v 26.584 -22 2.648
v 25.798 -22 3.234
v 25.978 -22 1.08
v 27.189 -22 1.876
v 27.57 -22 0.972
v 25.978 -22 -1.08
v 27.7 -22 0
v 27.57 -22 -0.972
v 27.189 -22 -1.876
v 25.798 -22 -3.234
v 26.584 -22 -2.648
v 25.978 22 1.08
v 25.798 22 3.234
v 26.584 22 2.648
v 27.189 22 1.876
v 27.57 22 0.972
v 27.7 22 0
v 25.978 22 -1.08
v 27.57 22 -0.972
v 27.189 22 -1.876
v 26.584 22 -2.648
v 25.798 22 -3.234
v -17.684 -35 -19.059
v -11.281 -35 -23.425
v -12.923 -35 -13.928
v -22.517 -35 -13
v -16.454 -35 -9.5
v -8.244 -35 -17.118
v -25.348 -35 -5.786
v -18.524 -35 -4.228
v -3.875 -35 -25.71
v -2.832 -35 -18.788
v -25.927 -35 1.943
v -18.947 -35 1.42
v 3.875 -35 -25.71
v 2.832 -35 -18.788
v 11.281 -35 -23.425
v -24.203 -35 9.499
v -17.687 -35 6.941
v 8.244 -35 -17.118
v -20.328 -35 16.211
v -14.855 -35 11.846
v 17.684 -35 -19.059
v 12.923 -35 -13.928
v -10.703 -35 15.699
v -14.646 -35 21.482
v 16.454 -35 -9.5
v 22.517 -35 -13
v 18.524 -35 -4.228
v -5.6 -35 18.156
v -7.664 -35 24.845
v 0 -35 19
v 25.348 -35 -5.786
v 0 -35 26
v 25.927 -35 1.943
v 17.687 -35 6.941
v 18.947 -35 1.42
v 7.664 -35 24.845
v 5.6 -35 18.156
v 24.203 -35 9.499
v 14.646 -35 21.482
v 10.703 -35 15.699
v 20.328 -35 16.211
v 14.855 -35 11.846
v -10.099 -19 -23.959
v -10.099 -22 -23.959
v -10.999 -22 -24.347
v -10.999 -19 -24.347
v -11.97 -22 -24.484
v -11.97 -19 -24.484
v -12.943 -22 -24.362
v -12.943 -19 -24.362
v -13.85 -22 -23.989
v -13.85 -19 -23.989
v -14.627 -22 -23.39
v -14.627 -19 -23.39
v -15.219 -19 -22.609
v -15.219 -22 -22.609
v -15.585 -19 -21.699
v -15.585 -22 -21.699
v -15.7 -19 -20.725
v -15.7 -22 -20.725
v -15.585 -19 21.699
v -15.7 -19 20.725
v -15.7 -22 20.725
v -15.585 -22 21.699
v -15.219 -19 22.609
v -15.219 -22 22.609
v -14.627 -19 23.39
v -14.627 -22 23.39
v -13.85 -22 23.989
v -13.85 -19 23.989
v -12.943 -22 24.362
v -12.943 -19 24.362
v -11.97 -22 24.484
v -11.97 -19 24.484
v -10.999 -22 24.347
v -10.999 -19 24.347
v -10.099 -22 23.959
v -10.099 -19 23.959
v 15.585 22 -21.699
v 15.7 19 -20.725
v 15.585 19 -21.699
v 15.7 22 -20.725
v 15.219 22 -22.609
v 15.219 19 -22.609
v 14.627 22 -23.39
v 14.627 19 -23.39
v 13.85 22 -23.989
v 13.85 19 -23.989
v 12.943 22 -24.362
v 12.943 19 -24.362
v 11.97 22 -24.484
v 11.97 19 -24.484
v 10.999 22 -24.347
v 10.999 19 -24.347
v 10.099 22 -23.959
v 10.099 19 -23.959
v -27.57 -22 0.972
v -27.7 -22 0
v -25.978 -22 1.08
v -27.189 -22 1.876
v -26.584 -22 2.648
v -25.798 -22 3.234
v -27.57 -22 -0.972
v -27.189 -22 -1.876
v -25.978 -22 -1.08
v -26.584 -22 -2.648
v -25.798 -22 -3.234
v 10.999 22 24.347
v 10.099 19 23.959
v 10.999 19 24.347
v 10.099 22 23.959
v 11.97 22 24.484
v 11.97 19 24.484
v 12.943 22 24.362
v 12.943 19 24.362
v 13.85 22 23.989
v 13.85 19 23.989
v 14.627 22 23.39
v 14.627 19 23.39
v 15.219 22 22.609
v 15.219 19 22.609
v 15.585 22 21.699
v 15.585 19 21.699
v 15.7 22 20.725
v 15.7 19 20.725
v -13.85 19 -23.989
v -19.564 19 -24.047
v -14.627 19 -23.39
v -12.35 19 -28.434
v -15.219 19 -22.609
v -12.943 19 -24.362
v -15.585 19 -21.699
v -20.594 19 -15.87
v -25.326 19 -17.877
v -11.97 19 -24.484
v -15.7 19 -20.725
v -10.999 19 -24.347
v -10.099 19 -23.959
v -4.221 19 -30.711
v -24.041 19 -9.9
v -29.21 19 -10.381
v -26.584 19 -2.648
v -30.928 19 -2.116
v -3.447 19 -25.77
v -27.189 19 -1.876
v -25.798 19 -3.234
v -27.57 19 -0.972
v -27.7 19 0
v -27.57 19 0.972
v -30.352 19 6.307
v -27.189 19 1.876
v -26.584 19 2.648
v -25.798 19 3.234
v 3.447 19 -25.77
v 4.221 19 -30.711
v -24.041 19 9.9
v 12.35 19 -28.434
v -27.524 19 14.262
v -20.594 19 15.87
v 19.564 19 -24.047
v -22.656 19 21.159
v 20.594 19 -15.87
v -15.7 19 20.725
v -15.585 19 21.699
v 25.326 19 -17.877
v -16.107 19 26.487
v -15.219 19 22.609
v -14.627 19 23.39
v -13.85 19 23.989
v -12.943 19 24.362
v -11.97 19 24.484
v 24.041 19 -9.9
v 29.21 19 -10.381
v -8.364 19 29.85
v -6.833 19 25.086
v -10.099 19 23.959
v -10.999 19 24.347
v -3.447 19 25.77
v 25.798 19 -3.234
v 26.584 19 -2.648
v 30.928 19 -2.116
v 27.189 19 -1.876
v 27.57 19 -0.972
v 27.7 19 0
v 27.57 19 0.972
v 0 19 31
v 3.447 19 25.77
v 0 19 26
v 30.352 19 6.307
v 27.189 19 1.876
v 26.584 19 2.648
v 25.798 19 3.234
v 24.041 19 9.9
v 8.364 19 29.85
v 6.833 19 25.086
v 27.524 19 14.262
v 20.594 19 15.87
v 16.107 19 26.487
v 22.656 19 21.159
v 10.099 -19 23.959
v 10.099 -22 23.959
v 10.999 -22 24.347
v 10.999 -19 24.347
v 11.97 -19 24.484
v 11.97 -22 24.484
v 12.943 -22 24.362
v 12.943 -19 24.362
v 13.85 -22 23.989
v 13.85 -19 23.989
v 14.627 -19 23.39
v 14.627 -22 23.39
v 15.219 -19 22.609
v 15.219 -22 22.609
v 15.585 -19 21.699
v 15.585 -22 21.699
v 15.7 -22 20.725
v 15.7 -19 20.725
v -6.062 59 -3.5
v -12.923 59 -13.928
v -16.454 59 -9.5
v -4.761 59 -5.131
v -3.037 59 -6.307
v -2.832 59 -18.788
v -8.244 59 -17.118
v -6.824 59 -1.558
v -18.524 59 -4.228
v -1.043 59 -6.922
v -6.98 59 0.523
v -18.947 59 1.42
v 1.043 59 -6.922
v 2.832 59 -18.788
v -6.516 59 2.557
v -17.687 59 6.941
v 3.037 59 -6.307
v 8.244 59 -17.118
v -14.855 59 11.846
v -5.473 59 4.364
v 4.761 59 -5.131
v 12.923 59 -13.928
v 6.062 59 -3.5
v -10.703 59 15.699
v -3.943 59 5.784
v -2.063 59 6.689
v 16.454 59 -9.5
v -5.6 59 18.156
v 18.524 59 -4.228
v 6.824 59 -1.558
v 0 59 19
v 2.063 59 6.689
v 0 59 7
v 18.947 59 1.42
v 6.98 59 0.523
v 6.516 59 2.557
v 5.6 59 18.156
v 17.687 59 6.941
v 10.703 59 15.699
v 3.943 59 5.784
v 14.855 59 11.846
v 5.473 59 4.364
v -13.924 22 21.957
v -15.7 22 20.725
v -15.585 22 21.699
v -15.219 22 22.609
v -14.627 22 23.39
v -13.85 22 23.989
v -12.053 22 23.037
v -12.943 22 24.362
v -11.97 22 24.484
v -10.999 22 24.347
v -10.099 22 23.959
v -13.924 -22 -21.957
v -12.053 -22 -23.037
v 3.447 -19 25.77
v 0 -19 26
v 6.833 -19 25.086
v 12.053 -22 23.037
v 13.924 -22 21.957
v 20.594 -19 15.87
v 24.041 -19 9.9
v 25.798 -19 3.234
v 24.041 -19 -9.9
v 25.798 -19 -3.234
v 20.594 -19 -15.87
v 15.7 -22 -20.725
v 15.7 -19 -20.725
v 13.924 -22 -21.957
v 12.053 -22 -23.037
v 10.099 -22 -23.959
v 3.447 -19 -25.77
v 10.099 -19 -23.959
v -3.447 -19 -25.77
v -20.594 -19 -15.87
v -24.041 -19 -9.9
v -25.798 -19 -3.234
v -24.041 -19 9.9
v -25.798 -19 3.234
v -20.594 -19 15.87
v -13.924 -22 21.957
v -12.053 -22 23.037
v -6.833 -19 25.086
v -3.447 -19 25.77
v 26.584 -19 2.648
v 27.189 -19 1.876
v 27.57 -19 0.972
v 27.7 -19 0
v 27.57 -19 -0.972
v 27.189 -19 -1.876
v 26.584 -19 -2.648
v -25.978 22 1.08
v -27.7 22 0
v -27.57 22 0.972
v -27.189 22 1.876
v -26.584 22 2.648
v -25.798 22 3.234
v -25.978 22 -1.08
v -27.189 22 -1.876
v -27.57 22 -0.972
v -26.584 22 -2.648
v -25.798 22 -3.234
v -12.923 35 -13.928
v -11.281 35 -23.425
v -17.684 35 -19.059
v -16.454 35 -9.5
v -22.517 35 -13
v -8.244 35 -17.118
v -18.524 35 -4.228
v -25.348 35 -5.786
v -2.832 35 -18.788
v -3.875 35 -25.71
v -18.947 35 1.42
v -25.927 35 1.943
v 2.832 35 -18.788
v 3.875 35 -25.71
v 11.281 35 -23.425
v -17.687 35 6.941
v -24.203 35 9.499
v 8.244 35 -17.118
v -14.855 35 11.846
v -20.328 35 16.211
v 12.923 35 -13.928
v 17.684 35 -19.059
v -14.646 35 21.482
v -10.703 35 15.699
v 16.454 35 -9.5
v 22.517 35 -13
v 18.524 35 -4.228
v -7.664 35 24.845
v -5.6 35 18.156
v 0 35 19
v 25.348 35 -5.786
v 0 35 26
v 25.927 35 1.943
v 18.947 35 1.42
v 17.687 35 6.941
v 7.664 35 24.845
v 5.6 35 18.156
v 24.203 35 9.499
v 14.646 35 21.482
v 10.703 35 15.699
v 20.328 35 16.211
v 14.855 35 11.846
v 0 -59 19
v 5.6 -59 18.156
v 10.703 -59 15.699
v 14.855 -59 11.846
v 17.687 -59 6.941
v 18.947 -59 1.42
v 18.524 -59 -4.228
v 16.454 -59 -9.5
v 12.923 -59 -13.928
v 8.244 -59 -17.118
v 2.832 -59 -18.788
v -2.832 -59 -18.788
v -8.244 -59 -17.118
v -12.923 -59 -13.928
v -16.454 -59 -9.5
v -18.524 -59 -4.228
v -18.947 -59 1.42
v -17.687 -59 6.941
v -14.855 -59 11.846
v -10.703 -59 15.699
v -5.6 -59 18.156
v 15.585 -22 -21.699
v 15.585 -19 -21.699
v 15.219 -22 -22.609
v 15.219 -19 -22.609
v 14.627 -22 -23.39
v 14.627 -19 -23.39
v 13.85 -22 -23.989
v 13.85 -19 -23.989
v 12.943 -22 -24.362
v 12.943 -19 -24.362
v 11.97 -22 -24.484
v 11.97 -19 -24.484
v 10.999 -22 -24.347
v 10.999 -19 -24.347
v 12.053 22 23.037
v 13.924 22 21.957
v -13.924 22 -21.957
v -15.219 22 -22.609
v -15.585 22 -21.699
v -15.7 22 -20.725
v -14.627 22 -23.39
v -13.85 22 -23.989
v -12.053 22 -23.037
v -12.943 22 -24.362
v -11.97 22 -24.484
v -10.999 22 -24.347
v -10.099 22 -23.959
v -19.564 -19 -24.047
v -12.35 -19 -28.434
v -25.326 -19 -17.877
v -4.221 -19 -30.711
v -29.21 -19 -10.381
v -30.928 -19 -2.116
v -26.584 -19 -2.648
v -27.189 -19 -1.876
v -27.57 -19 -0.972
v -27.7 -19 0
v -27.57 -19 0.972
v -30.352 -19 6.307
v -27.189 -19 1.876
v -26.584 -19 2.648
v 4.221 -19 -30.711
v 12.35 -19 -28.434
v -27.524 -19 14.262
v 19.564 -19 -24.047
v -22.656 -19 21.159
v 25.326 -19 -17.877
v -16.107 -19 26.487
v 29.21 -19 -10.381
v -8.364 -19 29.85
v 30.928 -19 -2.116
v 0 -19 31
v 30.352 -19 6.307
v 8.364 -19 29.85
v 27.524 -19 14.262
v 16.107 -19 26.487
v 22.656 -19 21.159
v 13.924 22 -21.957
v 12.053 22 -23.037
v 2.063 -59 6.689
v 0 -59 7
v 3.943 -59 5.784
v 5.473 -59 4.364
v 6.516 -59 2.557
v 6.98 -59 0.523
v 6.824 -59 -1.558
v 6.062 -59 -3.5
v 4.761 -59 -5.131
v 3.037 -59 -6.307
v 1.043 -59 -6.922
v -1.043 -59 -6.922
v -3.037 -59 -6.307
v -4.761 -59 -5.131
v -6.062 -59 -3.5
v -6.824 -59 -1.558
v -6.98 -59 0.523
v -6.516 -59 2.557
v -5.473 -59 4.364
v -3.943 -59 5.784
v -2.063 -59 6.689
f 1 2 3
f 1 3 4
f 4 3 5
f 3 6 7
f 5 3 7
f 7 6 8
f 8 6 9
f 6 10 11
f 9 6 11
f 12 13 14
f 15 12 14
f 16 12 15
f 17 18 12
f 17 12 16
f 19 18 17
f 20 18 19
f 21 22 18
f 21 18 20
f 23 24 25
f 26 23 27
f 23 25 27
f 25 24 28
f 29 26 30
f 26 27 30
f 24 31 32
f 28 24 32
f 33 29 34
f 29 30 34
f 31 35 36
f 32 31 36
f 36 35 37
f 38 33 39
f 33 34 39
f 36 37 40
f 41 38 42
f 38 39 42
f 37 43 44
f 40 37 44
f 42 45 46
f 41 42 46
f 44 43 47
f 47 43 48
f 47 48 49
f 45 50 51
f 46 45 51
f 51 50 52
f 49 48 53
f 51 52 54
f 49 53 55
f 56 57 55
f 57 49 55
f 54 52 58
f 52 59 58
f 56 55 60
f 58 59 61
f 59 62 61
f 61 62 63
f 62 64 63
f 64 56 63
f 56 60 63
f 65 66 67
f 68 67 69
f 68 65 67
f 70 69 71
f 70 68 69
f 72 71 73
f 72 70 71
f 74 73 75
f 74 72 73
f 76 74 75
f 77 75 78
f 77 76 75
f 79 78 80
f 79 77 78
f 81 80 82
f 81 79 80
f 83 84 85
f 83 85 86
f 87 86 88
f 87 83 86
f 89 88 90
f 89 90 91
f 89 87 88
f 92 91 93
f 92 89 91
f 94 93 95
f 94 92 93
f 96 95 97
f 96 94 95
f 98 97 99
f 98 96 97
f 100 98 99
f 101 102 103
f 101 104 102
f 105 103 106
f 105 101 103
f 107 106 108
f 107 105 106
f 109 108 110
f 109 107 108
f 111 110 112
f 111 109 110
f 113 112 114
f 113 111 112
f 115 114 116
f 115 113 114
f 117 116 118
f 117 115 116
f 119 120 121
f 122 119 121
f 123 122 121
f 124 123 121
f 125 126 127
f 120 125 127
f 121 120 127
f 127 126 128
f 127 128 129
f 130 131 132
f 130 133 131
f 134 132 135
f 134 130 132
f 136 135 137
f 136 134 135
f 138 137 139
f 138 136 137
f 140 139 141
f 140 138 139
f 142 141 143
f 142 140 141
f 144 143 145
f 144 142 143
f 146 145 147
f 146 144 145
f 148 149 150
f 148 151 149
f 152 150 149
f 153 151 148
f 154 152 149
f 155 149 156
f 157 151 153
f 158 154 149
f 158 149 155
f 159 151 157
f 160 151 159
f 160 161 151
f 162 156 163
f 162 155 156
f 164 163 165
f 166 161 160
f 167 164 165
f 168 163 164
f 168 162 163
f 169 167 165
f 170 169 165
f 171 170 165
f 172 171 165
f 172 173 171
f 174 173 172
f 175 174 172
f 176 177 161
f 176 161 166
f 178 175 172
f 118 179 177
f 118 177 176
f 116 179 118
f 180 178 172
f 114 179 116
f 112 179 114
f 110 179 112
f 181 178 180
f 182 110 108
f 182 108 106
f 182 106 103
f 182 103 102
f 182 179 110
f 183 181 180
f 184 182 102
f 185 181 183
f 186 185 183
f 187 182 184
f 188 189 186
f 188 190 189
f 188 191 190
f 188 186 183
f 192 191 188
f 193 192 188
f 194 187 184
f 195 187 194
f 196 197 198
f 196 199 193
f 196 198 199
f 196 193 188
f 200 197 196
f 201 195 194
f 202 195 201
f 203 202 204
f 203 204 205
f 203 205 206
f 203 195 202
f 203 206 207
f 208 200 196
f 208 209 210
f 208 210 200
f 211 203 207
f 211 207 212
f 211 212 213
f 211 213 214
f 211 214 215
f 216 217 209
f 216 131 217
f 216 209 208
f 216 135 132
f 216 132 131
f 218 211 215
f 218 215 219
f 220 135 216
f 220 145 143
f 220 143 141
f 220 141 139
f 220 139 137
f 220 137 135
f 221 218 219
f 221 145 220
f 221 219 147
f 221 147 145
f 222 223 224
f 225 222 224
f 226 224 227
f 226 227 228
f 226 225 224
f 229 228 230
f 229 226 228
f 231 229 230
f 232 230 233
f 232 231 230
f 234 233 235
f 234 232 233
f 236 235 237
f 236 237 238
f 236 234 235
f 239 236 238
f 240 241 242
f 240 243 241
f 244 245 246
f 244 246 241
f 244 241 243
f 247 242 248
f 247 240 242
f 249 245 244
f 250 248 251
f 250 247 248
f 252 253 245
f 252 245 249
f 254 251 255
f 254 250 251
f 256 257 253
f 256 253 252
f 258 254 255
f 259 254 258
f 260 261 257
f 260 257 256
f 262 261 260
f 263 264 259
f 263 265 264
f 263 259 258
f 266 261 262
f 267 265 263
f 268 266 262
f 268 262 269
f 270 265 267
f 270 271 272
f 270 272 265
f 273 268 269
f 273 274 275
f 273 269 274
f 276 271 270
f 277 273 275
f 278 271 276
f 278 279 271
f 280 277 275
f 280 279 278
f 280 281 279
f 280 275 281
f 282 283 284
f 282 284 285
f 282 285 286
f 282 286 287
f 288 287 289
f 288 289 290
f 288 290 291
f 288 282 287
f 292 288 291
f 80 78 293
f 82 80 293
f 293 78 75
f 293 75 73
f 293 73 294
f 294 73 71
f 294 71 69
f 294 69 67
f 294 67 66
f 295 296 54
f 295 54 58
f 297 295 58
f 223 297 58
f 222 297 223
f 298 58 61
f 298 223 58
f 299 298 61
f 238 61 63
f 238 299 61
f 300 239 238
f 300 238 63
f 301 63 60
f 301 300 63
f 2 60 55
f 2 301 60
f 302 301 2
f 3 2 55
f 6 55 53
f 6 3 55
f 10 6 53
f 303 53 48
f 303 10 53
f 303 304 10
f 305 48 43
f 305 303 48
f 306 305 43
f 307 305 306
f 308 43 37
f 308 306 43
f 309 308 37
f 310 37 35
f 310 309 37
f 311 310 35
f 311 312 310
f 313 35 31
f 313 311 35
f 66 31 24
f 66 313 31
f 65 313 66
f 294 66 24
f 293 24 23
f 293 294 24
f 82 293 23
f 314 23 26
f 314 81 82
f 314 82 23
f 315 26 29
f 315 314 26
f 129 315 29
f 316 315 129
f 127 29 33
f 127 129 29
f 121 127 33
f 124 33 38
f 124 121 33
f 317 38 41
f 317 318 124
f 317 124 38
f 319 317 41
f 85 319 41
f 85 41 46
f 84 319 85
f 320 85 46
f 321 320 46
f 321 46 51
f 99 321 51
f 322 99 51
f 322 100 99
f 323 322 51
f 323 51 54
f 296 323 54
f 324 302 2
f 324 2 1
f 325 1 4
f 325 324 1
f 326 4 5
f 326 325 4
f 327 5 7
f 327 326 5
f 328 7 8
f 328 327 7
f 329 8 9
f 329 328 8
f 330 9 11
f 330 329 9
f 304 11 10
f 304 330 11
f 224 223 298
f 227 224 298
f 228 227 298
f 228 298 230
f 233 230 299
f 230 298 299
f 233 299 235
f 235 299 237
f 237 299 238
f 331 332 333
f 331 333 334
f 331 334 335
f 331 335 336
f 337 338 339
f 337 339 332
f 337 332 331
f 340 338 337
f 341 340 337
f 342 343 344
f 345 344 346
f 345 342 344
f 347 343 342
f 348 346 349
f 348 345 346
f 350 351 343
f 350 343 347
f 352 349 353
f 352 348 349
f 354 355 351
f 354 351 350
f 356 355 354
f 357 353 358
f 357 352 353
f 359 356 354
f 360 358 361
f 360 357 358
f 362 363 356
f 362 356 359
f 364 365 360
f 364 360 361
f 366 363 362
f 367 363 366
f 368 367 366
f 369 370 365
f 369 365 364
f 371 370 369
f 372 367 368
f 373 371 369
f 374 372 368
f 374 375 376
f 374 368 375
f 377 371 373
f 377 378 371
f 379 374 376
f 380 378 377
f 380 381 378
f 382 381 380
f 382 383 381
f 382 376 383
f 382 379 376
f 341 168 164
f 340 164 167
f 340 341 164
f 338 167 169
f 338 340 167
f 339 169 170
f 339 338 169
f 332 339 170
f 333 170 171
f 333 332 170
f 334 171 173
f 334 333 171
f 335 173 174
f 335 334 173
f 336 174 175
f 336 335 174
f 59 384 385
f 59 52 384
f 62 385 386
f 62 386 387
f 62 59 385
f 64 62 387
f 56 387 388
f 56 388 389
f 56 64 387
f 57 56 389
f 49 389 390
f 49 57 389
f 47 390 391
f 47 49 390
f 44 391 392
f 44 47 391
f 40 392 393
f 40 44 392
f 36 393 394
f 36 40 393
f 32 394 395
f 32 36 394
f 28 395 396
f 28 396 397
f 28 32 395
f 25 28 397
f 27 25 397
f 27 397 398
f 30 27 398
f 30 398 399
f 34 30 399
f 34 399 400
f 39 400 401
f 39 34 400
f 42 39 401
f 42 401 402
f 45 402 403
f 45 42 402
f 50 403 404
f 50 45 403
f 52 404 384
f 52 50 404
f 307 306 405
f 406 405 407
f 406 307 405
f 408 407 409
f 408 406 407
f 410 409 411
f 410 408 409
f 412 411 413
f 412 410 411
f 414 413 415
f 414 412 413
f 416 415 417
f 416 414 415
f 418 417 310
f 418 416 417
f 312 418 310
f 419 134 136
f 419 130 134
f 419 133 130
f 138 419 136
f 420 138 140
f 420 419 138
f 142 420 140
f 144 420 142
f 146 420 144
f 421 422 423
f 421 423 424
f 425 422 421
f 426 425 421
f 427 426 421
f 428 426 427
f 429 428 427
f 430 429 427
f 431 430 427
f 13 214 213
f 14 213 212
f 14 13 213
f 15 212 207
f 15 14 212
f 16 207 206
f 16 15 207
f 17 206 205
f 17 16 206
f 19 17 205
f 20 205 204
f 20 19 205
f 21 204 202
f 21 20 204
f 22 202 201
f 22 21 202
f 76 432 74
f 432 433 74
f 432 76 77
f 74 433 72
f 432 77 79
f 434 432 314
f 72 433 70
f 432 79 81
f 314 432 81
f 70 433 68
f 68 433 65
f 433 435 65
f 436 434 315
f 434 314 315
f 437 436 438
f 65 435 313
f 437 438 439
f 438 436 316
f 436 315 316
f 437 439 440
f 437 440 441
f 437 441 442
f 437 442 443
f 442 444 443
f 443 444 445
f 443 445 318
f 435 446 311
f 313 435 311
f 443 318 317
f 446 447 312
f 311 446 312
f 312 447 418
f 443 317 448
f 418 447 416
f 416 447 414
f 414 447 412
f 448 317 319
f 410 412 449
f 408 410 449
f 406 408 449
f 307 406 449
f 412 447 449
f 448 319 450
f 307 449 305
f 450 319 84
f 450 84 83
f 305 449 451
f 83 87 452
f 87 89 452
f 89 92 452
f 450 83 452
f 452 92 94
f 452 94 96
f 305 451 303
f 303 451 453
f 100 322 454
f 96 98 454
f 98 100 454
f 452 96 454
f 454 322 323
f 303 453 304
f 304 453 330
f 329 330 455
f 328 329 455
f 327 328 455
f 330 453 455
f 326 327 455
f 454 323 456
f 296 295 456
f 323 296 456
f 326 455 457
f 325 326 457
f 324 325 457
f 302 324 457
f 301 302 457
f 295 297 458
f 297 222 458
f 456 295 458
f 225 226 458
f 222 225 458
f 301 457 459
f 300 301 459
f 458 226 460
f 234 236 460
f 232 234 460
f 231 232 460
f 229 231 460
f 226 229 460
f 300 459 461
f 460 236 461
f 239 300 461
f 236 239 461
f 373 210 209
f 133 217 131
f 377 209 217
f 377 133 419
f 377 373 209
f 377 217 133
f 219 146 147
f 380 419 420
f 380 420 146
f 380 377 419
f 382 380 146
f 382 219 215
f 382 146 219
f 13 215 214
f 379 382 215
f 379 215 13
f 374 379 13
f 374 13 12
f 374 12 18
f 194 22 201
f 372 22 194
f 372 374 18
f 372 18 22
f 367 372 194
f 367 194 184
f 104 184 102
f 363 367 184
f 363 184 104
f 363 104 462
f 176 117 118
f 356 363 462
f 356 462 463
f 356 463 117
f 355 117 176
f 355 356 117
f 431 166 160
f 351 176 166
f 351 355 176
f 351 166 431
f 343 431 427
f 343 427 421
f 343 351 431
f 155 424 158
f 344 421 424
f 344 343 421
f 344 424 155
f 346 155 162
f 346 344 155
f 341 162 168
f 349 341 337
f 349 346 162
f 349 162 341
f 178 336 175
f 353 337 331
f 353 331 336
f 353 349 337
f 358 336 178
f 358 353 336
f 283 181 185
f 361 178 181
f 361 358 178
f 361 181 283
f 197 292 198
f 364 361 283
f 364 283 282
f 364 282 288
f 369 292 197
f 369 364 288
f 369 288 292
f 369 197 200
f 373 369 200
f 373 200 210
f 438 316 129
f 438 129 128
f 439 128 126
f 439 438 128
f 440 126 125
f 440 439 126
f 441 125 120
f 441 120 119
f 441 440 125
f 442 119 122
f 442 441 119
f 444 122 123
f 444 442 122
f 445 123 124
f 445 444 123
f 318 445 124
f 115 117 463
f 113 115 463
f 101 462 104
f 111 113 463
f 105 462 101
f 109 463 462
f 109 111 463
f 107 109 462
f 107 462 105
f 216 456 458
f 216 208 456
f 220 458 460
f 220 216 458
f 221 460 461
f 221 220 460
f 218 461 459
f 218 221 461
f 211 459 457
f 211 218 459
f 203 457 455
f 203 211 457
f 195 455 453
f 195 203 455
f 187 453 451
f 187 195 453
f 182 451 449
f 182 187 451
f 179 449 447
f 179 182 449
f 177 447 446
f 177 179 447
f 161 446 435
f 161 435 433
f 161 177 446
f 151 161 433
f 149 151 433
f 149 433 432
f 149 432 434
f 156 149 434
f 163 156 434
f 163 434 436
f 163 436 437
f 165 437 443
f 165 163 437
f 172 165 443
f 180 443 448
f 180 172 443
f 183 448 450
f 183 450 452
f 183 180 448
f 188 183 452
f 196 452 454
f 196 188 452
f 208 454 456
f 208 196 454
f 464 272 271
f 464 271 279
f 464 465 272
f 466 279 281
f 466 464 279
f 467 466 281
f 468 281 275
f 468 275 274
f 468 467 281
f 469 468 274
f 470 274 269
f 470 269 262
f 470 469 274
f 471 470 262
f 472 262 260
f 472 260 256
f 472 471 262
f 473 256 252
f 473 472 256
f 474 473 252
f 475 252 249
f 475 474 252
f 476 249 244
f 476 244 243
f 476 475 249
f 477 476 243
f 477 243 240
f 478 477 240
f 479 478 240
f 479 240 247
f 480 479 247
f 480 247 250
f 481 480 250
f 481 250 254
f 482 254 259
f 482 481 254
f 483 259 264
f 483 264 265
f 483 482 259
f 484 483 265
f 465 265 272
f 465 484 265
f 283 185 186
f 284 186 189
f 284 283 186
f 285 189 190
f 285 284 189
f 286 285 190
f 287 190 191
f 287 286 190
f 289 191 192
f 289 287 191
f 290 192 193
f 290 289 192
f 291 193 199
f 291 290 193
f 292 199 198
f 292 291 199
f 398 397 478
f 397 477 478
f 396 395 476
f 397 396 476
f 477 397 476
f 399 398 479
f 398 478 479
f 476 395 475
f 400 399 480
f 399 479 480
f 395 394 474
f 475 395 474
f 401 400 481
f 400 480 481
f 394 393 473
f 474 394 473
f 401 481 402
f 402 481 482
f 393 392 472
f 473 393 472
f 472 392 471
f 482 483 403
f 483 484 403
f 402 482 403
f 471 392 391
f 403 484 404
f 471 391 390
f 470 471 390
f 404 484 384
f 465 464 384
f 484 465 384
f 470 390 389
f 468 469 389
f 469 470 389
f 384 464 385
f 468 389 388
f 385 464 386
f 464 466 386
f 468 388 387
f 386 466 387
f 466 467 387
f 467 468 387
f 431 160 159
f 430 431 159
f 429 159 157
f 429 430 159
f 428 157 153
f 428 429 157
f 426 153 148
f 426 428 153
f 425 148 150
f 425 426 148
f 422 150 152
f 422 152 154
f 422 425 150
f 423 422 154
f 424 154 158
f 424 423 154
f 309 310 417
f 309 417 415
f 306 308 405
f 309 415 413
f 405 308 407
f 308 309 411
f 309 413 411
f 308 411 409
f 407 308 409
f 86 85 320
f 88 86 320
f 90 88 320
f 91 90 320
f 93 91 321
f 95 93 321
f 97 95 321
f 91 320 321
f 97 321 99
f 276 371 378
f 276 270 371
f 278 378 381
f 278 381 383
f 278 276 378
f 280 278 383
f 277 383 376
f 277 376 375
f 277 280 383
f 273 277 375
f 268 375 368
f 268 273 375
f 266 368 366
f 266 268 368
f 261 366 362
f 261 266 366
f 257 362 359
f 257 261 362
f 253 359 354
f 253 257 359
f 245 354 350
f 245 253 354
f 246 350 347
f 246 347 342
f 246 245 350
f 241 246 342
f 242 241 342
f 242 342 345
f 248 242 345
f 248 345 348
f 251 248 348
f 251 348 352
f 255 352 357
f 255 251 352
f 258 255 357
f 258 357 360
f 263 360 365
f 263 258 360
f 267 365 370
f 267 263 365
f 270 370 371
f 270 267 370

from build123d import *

# Parameters (mm, degrees)
SKETCH1_R                   = 19
SKETCH1_R_2                 = 7
CONNECTOR_AXLE_SLEEVE_DEPTH = 59
SKETCH2_R                   = 31
SKETCH2_R_2                 = 11
OUTER_BOLT_FLANGE_DEPTH     = 19
SKETCH3_R                   = 26
SKETCH3_R_2                 = 9
STEPPED_HUB_SHOULDER_DEPTH  = 35
SKETCH4_R                   = 3.7
BOLT_CIRCLE_PAD_1_DEPTH     = 22
SKETCH5_R                   = 3.7
BOLT_CIRCLE_PAD_2_DEPTH     = 22
SKETCH6_R                   = 3.7
BOLT_CIRCLE_PAD_3_DEPTH     = 22
SKETCH7_R                   = 3.7
BOLT_CIRCLE_PAD_4_DEPTH     = 22
SKETCH8_R                   = 3.7
BOLT_CIRCLE_PAD_5_DEPTH     = 22
SKETCH9_R                   = 3.7
BOLT_CIRCLE_PAD_6_DEPTH     = 22


with BuildPart() as part:
    # Sketch1 → connector axle sleeve (new, symmetric)
    with BuildSketch(Plane(origin=(0, 0, 0), x_dir=(1, 0, 0), z_dir=(0, 1, 0))):
        with Locations(Location((0, 0, 0), (0, 0, 270))):
            Circle(SKETCH1_R)
        with Locations(Location((0, 0, 0), (0, 0, 270))):
            Circle(SKETCH1_R_2, mode=Mode.SUBTRACT)
    extrude(amount=CONNECTOR_AXLE_SLEEVE_DEPTH, both=True)

    # Sketch2 → outer bolt flange (add, symmetric)
    with BuildSketch(Plane(origin=(0, 0, 0), x_dir=(1, 0, 0), z_dir=(0, 1, 0))):
        with Locations(Location((0, 0, 0), (0, 0, 270))):
            Circle(SKETCH2_R)
        Circle(SKETCH2_R_2, mode=Mode.SUBTRACT)
    extrude(amount=OUTER_BOLT_FLANGE_DEPTH, both=True)

    # Sketch3 → stepped hub shoulder (add, symmetric)
    with BuildSketch(Plane(origin=(0, 0, 0), x_dir=(1, 0, 0), z_dir=(0, 1, 0))):
        with Locations(Location((0, 0, 0), (0, 0, 270))):
            Circle(SKETCH3_R)
        Circle(SKETCH3_R_2, mode=Mode.SUBTRACT)
    extrude(amount=STEPPED_HUB_SHOULDER_DEPTH, both=True)

    # Sketch4 → bolt circle pad 1 (add, symmetric)
    with BuildSketch(Plane(origin=(0, 0, 0), x_dir=(1, 0, 0), z_dir=(0, 1, 0))):
        with Locations((24, 0)):
            Circle(SKETCH4_R)
    extrude(amount=BOLT_CIRCLE_PAD_1_DEPTH, both=True)

    # Sketch5 → bolt circle pad 2 (add, symmetric)
    with BuildSketch(Plane(origin=(0, 0, 0), x_dir=(1, 0, 0), z_dir=(0, 1, 0))):
        with Locations((12, 20.784609691)):
            Circle(SKETCH5_R)
    extrude(amount=BOLT_CIRCLE_PAD_2_DEPTH, both=True)

    # Sketch6 → bolt circle pad 3 (add, symmetric)
    with BuildSketch(Plane(origin=(0, 0, 0), x_dir=(1, 0, 0), z_dir=(0, 1, 0))):
        with Locations((-12, 20.784609691)):
            Circle(SKETCH6_R)
    extrude(amount=BOLT_CIRCLE_PAD_3_DEPTH, both=True)

    # Sketch7 → bolt circle pad 4 (add, symmetric)
    with BuildSketch(Plane(origin=(0, 0, 0), x_dir=(1, 0, 0), z_dir=(0, 1, 0))):
        with Locations((-24, 0)):
            Circle(SKETCH7_R)
    extrude(amount=BOLT_CIRCLE_PAD_4_DEPTH, both=True)

    # Sketch8 → bolt circle pad 5 (add, symmetric)
    with BuildSketch(Plane(origin=(0, 0, 0), x_dir=(1, 0, 0), z_dir=(0, 1, 0))):
        with Locations((-12, -20.784609691)):
            Circle(SKETCH8_R)
    extrude(amount=BOLT_CIRCLE_PAD_5_DEPTH, both=True)

    # Sketch9 → bolt circle pad 6 (add, symmetric)
    with BuildSketch(Plane(origin=(0, 0, 0), x_dir=(1, 0, 0), z_dir=(0, 1, 0))):
        with Locations((12, -20.784609691)):
            Circle(SKETCH9_R)
    extrude(amount=BOLT_CIRCLE_PAD_6_DEPTH, both=True)


solid = part.part
